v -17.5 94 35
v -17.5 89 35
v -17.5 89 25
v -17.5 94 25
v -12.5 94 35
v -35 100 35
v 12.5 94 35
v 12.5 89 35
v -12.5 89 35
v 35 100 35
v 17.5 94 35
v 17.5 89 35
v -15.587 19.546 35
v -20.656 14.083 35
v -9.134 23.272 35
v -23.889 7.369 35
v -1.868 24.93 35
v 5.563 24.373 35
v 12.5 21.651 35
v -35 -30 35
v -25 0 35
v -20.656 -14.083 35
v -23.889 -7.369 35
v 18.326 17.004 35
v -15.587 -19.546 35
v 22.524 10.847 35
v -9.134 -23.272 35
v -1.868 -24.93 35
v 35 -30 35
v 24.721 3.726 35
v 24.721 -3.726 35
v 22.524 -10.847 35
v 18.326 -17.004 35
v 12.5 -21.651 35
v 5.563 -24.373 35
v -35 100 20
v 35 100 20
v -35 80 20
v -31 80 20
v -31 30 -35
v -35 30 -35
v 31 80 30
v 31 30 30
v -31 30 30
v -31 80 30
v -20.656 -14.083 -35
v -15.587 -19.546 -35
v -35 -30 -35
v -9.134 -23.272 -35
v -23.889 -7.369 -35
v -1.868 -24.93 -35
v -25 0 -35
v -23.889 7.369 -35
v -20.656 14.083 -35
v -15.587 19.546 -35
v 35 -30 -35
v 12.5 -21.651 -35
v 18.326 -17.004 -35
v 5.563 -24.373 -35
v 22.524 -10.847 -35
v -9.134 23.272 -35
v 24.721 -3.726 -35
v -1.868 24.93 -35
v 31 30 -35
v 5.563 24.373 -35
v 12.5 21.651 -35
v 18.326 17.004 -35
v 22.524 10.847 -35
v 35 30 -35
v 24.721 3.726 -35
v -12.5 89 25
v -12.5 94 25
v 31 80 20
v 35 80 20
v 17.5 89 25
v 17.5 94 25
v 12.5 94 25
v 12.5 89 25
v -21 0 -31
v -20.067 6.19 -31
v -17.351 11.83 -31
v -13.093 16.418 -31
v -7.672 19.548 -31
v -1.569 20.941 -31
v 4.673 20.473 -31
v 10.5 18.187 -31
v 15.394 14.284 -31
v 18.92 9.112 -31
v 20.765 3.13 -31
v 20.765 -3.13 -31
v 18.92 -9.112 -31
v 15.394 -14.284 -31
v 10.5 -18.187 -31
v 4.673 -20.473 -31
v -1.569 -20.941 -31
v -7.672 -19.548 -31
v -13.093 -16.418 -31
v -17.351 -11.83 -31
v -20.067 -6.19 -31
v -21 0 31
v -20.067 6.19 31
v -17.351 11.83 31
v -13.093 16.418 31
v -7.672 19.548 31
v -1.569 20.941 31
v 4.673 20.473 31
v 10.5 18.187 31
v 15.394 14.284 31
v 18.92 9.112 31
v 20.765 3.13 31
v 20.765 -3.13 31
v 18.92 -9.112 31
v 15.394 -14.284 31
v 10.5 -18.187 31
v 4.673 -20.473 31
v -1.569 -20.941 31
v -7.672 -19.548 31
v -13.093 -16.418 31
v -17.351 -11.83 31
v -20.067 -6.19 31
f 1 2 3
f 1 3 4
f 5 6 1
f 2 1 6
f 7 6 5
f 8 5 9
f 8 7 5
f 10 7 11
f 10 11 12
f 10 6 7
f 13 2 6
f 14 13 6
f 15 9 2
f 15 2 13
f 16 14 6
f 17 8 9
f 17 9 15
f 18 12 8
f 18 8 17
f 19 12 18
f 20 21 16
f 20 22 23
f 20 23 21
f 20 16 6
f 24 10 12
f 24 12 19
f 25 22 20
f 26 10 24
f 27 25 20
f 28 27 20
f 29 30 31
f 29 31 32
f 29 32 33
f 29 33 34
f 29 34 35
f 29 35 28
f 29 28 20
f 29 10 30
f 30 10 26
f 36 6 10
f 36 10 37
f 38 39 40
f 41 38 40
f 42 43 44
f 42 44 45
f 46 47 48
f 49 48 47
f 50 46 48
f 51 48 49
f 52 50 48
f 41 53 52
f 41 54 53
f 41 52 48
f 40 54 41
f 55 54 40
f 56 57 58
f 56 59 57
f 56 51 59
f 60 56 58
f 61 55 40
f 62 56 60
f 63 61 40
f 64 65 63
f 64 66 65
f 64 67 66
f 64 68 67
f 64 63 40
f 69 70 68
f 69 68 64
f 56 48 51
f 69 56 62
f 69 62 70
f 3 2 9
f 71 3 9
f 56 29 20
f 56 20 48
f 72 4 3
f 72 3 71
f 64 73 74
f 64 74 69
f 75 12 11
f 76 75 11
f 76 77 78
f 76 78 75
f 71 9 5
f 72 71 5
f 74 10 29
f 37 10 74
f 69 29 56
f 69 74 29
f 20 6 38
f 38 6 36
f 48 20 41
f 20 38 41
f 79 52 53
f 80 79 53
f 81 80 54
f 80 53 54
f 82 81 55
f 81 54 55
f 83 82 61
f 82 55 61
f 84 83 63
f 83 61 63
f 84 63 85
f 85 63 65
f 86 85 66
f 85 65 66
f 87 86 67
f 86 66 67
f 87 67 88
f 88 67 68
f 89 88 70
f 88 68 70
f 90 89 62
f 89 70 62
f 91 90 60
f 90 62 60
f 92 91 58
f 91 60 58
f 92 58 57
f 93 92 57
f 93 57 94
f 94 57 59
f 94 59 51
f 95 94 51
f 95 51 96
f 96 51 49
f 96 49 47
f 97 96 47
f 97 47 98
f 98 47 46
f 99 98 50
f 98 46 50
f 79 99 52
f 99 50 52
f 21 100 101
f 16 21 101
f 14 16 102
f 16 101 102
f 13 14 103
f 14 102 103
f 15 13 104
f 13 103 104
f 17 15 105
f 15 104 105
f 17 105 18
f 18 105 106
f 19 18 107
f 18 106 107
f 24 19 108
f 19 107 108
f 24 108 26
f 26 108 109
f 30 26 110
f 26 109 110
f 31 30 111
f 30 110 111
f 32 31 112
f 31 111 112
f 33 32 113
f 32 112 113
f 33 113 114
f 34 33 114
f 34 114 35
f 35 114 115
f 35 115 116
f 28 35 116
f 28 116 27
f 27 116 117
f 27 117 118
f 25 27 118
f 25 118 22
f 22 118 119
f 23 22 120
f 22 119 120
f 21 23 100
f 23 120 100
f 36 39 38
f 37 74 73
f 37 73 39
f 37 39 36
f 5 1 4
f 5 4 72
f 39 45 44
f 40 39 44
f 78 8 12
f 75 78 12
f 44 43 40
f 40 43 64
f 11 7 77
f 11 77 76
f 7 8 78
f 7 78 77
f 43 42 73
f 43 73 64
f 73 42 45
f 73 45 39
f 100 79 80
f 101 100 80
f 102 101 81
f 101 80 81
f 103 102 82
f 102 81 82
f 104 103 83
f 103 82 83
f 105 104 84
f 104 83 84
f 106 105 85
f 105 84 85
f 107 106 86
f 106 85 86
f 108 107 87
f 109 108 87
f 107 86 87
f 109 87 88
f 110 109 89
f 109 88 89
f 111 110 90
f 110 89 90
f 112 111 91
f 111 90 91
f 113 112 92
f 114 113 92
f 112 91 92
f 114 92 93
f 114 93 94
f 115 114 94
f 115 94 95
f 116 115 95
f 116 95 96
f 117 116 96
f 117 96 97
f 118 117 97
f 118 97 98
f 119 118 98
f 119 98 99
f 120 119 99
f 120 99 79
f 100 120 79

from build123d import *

# Parameters (mm, degrees)
SKETCH1_W           = 5
SKETCH1_H           = 70
SKETCH1_W_2         = 70
SKETCH1_H_2         = 60
BOSS_EXTRUDE1_DEPTH = 35
SKETCH2_R           = 21
CUT_EXTRUDE1_DEPTH  = 127.984250992
CHAMFER1_SIZE       = 4
CHAMFER2_SIZE       = 4
SKETCH9_W           = 10
SKETCH9_H           = 20
BOSS_EXTRUDE2_DEPTH = 70
RIB1_REACH          = 128.984
SKETCH10_WALL_W     = 330.29884572
SKETCH10_WALL_H     = 4
SKETCH11_W          = 5
SKETCH11_H          = 5
CUT_EXTRUDE2_DEPTH  = 10


with BuildPart() as part:
    # Sketch1 → Boss-Extrude1 (new, symmetric)
    with BuildSketch(Plane(origin=(0, 0, 0), x_dir=(0, 0, -1), z_dir=(1, 0, 0))):
        with Locations((-32.5, 65)):
            Rectangle(SKETCH1_W, SKETCH1_H)
        Rectangle(SKETCH1_W_2, SKETCH1_H_2)
    extrude(amount=BOSS_EXTRUDE1_DEPTH, both=True)

    # Sketch2 → Cut-Extrude1 (cut, through all)
    with BuildSketch(Plane(origin=(0, 0, -35), x_dir=(-1, 0, 0), z_dir=(0, 0, -1))):
        Circle(SKETCH2_R)
    extrude(amount=-CUT_EXTRUDE1_DEPTH, mode=Mode.SUBTRACT)

    # Chamfer1
    chamfer1_edges = [part.edges().sort_by_distance(p)[0] for p in [
        (21, 0, 35),
    ]]
    chamfer(chamfer1_edges, length=CHAMFER1_SIZE)

    # Chamfer2
    chamfer2_edges = [part.edges().sort_by_distance(p)[0] for p in [
        (21, 0, -35),
    ]]
    chamfer(chamfer2_edges, length=CHAMFER2_SIZE)

    # Sketch9 → Boss-Extrude2 (add, through all)
    with BuildSketch(Plane(origin=(35, 0, 0), x_dir=(0, 0, -1), z_dir=(1, 0, 0))):
        with Locations((-25, 90)):
            Rectangle(SKETCH9_W, SKETCH9_H)
    extrude(amount=-BOSS_EXTRUDE2_DEPTH)

    # Sketch10 wall → Rib1 (add, up to next)
    with BuildSketch(Plane(origin=(35, 55, -7.5), x_dir=(0, -0.672672793996, -0.739940073396), z_dir=(0, 0.739940073396, -0.672672793996)), mode=Mode.PRIVATE) as rib1_sk1:
        with Locations((0, 2)):
            Rectangle(SKETCH10_WALL_W, SKETCH10_WALL_H)
    rib1_tool1 = extrude(rib1_sk1.sketch, amount=-RIB1_REACH, mode=Mode.PRIVATE) - part.part
    rib1 = rib1_tool1.solids().sort_by_distance((35, 55, -7.5))[0]
    add(rib1)

    # Mirror1: Rib1 across plane
    add(rib1.mirror(Plane(origin=(0, 0, 0), x_dir=(0, 0, 1), z_dir=(1, 0, 0))))

    # Sketch11 → Cut-Extrude2 (cut)
    with BuildSketch(Plane.XY.offset(35)):
        with Locations((15, 91.5)):
            Rectangle(SKETCH11_W, SKETCH11_H)
        with Locations((-15, 91.5)):
            Rectangle(SKETCH11_W, SKETCH11_H)
    extrude(amount=-CUT_EXTRUDE2_DEPTH, mode=Mode.SUBTRACT)


solid = part.part
